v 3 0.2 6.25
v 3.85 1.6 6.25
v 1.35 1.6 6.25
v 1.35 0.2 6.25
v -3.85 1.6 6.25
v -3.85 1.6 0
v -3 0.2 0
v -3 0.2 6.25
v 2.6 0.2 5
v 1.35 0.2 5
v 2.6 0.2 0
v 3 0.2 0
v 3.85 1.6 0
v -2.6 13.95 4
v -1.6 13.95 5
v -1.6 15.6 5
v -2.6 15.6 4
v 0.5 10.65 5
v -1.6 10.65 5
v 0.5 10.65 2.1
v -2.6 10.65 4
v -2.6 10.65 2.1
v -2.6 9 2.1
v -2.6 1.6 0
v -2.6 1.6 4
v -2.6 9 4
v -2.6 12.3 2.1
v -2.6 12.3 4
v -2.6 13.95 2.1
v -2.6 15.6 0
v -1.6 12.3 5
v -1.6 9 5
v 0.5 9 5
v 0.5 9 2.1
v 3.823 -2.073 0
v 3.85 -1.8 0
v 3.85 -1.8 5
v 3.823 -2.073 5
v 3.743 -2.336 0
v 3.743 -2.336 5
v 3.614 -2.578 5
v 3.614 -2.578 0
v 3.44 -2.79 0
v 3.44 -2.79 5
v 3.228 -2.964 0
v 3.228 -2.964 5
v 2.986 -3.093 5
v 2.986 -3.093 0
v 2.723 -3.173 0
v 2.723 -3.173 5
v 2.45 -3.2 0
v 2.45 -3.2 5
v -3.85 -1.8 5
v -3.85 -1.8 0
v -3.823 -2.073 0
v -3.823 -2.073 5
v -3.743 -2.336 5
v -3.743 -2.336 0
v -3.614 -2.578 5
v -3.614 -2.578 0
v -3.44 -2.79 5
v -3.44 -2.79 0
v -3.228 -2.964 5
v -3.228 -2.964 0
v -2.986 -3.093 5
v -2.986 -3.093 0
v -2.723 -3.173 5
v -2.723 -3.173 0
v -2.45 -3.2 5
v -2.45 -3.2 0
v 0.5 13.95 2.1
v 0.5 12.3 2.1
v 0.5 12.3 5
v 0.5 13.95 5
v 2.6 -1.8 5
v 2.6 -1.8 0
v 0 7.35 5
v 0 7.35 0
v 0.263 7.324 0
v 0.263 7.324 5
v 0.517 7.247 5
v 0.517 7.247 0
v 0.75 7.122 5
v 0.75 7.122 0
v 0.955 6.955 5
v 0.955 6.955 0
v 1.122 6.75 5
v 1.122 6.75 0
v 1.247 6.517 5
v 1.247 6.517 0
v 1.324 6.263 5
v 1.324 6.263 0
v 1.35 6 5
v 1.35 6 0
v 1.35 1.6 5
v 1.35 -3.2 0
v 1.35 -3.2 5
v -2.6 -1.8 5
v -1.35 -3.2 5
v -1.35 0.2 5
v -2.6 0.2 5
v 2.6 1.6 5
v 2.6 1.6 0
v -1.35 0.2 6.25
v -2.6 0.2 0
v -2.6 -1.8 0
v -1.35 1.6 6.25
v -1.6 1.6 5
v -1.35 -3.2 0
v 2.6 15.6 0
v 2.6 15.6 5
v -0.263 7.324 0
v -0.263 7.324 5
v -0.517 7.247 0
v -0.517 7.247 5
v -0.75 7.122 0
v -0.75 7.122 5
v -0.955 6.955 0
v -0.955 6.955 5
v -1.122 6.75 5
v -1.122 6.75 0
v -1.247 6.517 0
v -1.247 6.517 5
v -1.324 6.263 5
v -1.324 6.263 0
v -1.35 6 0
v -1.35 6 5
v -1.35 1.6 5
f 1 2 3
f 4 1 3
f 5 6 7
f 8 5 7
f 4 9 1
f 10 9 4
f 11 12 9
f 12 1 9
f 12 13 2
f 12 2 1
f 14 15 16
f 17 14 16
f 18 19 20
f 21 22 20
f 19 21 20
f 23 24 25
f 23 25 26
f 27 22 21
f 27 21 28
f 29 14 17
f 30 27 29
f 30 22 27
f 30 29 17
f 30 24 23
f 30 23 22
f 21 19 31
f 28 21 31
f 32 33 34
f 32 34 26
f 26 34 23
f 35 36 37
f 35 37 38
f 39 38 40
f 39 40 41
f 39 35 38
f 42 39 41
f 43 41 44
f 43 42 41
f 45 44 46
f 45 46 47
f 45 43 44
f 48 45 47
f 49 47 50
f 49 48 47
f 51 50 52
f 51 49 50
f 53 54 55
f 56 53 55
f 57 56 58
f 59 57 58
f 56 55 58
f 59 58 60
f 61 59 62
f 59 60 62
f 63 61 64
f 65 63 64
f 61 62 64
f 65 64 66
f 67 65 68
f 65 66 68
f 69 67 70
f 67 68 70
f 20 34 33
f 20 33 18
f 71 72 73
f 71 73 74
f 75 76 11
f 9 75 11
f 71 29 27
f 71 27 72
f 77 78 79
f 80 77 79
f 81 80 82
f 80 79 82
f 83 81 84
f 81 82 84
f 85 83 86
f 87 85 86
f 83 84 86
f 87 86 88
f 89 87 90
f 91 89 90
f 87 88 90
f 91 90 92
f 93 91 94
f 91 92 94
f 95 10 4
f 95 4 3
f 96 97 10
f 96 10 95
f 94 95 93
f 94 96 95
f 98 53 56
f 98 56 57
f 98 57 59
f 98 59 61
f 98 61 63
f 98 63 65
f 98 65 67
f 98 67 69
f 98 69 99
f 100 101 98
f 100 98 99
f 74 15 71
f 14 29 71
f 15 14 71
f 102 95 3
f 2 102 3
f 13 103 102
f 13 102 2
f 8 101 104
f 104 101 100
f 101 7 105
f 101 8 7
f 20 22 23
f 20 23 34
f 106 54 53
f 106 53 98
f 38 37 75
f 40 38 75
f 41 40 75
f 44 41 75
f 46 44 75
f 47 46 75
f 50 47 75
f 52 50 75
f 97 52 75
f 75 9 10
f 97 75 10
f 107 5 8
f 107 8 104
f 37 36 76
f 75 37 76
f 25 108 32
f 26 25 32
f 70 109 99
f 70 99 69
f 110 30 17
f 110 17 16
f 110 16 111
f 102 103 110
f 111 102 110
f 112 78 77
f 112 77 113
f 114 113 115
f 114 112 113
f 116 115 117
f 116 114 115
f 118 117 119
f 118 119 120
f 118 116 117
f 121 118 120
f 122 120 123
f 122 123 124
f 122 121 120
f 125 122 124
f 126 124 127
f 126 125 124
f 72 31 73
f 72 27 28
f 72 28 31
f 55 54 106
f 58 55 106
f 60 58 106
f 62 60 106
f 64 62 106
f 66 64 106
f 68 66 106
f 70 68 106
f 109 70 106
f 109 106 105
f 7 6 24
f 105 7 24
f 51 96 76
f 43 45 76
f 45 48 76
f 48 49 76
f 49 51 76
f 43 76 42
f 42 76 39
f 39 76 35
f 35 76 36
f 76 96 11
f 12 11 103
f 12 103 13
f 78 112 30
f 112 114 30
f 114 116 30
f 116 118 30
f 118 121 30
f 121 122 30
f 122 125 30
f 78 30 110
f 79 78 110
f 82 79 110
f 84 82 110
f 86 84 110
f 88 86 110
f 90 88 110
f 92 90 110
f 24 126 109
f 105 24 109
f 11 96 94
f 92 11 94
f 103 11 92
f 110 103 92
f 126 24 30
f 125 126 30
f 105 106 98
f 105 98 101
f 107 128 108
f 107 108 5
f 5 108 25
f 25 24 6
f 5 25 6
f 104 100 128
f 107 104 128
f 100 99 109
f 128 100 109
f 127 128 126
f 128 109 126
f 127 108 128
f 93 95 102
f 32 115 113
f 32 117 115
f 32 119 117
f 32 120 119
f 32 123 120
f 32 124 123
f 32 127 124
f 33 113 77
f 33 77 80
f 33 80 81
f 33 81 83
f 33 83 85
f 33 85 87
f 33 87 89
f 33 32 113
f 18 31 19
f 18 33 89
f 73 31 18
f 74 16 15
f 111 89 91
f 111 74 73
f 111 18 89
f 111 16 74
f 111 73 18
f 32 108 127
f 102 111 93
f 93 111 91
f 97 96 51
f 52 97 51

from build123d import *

# Parameters (mm, degrees)
PAD017_DEPTH           = 5
PAD020_DEPTH           = 6.25
SKETCH040_W            = 5.2
SKETCH040_H            = 1.65
PAD022_DEPTH           = 2.1
SKETCH041_W            = 2.1
SKETCH041_H            = 1.65
PAD023_DEPTH           = 5
SKETCH042_W            = 5.2
SKETCH042_H            = 1.65
PAD024_DEPTH           = 5
LINEARPATTERN010_COUNT = 2
LINEARPATTERN010_PITCH = 3.3
CHAMFER_SIZE           = 1


with BuildPart() as bc_c:
    # Sketch034 → Pad017 (new body)
    with BuildSketch(Plane.XY):
        with BuildLine():
            Line((-1.35, -1.8), (-1.35, 6))
            ThreePointArc((0, 7.35), (-0.954594, 6.954594), (-1.35, 6))
            Line((0, 9), (0, 7.35))
            Line((-2.6, 9), (0, 9))
            Line((-2.6, -1.8), (-2.6, 9))
            Line((-3.85, -1.8), (-2.6, -1.8))
            ThreePointArc((-3.85, -1.8), (-3.439949, -2.789949), (-2.45, -3.2))
            Line((-1.35, -3.2), (-2.45, -3.2))
            Line((-1.35, -1.8), (-1.35, -3.2))
        make_face()
    extrude(amount=PAD017_DEPTH)

    # Sketch037 → Pad020 (join)
    with BuildSketch(Plane.XY):
        Polygon((-1.35, 0.2), (-1.35, 1.6), (-2.6, 1.6), (-3.85, 1.6), (-3, 0.2), (-2.6, 0.2), align=None)
    extrude(amount=PAD020_DEPTH)


with BuildPart() as bc_s_mirrored:
    # Mirror001: instance of _bc_c
    add(bc_c.part.mirror(Plane(origin=(0, 0, 0), x_dir=(0, 1, 0), z_dir=(-1, 0, 0))))


with BuildPart() as body012:
    # Fusion001 base: copy of _bc_c
    add(bc_c.part)

    # Fusion001: union _bc_s(mirrored)
    add(bc_s_mirrored.part)

    # Sketch040 → Pad022 (new body)
    with BuildSketch(Plane.XY):
        with Locations((0, 9.825)):
            Rectangle(SKETCH040_W, SKETCH040_H)
    pad022 = extrude(amount=PAD022_DEPTH)

    # Sketch041 → Pad023 (join)
    with BuildSketch(Plane.XY):
        with Locations((1.55, 9.825)):
            Rectangle(SKETCH041_W, SKETCH041_H)
    pad023 = extrude(amount=PAD023_DEPTH)

    # Sketch042 → Pad024 (join)
    with BuildSketch(Plane.XY):
        with Locations((0, 11.475)):
            Rectangle(SKETCH042_W, SKETCH042_H)
    pad024 = extrude(amount=PAD024_DEPTH)

    # LinearPattern010: Pad024, Pad023, Pad022 ×2
    with Locations(*[(0, i * LINEARPATTERN010_PITCH, 0) for i in range(1, LINEARPATTERN010_COUNT)]):
        add(pad024)
        add(pad023)
        add(pad022)

    # Chamfer
    chamfer_edges = [body012.edges().sort_by_distance(p)[0] for p in [
        (-2.6, 5.3, 5),
        (-2.6, 11.475, 5),
        (-2.6, 14.775, 5),
    ]]
    chamfer(chamfer_edges, length=CHAMFER_SIZE)


solid = body012.part
